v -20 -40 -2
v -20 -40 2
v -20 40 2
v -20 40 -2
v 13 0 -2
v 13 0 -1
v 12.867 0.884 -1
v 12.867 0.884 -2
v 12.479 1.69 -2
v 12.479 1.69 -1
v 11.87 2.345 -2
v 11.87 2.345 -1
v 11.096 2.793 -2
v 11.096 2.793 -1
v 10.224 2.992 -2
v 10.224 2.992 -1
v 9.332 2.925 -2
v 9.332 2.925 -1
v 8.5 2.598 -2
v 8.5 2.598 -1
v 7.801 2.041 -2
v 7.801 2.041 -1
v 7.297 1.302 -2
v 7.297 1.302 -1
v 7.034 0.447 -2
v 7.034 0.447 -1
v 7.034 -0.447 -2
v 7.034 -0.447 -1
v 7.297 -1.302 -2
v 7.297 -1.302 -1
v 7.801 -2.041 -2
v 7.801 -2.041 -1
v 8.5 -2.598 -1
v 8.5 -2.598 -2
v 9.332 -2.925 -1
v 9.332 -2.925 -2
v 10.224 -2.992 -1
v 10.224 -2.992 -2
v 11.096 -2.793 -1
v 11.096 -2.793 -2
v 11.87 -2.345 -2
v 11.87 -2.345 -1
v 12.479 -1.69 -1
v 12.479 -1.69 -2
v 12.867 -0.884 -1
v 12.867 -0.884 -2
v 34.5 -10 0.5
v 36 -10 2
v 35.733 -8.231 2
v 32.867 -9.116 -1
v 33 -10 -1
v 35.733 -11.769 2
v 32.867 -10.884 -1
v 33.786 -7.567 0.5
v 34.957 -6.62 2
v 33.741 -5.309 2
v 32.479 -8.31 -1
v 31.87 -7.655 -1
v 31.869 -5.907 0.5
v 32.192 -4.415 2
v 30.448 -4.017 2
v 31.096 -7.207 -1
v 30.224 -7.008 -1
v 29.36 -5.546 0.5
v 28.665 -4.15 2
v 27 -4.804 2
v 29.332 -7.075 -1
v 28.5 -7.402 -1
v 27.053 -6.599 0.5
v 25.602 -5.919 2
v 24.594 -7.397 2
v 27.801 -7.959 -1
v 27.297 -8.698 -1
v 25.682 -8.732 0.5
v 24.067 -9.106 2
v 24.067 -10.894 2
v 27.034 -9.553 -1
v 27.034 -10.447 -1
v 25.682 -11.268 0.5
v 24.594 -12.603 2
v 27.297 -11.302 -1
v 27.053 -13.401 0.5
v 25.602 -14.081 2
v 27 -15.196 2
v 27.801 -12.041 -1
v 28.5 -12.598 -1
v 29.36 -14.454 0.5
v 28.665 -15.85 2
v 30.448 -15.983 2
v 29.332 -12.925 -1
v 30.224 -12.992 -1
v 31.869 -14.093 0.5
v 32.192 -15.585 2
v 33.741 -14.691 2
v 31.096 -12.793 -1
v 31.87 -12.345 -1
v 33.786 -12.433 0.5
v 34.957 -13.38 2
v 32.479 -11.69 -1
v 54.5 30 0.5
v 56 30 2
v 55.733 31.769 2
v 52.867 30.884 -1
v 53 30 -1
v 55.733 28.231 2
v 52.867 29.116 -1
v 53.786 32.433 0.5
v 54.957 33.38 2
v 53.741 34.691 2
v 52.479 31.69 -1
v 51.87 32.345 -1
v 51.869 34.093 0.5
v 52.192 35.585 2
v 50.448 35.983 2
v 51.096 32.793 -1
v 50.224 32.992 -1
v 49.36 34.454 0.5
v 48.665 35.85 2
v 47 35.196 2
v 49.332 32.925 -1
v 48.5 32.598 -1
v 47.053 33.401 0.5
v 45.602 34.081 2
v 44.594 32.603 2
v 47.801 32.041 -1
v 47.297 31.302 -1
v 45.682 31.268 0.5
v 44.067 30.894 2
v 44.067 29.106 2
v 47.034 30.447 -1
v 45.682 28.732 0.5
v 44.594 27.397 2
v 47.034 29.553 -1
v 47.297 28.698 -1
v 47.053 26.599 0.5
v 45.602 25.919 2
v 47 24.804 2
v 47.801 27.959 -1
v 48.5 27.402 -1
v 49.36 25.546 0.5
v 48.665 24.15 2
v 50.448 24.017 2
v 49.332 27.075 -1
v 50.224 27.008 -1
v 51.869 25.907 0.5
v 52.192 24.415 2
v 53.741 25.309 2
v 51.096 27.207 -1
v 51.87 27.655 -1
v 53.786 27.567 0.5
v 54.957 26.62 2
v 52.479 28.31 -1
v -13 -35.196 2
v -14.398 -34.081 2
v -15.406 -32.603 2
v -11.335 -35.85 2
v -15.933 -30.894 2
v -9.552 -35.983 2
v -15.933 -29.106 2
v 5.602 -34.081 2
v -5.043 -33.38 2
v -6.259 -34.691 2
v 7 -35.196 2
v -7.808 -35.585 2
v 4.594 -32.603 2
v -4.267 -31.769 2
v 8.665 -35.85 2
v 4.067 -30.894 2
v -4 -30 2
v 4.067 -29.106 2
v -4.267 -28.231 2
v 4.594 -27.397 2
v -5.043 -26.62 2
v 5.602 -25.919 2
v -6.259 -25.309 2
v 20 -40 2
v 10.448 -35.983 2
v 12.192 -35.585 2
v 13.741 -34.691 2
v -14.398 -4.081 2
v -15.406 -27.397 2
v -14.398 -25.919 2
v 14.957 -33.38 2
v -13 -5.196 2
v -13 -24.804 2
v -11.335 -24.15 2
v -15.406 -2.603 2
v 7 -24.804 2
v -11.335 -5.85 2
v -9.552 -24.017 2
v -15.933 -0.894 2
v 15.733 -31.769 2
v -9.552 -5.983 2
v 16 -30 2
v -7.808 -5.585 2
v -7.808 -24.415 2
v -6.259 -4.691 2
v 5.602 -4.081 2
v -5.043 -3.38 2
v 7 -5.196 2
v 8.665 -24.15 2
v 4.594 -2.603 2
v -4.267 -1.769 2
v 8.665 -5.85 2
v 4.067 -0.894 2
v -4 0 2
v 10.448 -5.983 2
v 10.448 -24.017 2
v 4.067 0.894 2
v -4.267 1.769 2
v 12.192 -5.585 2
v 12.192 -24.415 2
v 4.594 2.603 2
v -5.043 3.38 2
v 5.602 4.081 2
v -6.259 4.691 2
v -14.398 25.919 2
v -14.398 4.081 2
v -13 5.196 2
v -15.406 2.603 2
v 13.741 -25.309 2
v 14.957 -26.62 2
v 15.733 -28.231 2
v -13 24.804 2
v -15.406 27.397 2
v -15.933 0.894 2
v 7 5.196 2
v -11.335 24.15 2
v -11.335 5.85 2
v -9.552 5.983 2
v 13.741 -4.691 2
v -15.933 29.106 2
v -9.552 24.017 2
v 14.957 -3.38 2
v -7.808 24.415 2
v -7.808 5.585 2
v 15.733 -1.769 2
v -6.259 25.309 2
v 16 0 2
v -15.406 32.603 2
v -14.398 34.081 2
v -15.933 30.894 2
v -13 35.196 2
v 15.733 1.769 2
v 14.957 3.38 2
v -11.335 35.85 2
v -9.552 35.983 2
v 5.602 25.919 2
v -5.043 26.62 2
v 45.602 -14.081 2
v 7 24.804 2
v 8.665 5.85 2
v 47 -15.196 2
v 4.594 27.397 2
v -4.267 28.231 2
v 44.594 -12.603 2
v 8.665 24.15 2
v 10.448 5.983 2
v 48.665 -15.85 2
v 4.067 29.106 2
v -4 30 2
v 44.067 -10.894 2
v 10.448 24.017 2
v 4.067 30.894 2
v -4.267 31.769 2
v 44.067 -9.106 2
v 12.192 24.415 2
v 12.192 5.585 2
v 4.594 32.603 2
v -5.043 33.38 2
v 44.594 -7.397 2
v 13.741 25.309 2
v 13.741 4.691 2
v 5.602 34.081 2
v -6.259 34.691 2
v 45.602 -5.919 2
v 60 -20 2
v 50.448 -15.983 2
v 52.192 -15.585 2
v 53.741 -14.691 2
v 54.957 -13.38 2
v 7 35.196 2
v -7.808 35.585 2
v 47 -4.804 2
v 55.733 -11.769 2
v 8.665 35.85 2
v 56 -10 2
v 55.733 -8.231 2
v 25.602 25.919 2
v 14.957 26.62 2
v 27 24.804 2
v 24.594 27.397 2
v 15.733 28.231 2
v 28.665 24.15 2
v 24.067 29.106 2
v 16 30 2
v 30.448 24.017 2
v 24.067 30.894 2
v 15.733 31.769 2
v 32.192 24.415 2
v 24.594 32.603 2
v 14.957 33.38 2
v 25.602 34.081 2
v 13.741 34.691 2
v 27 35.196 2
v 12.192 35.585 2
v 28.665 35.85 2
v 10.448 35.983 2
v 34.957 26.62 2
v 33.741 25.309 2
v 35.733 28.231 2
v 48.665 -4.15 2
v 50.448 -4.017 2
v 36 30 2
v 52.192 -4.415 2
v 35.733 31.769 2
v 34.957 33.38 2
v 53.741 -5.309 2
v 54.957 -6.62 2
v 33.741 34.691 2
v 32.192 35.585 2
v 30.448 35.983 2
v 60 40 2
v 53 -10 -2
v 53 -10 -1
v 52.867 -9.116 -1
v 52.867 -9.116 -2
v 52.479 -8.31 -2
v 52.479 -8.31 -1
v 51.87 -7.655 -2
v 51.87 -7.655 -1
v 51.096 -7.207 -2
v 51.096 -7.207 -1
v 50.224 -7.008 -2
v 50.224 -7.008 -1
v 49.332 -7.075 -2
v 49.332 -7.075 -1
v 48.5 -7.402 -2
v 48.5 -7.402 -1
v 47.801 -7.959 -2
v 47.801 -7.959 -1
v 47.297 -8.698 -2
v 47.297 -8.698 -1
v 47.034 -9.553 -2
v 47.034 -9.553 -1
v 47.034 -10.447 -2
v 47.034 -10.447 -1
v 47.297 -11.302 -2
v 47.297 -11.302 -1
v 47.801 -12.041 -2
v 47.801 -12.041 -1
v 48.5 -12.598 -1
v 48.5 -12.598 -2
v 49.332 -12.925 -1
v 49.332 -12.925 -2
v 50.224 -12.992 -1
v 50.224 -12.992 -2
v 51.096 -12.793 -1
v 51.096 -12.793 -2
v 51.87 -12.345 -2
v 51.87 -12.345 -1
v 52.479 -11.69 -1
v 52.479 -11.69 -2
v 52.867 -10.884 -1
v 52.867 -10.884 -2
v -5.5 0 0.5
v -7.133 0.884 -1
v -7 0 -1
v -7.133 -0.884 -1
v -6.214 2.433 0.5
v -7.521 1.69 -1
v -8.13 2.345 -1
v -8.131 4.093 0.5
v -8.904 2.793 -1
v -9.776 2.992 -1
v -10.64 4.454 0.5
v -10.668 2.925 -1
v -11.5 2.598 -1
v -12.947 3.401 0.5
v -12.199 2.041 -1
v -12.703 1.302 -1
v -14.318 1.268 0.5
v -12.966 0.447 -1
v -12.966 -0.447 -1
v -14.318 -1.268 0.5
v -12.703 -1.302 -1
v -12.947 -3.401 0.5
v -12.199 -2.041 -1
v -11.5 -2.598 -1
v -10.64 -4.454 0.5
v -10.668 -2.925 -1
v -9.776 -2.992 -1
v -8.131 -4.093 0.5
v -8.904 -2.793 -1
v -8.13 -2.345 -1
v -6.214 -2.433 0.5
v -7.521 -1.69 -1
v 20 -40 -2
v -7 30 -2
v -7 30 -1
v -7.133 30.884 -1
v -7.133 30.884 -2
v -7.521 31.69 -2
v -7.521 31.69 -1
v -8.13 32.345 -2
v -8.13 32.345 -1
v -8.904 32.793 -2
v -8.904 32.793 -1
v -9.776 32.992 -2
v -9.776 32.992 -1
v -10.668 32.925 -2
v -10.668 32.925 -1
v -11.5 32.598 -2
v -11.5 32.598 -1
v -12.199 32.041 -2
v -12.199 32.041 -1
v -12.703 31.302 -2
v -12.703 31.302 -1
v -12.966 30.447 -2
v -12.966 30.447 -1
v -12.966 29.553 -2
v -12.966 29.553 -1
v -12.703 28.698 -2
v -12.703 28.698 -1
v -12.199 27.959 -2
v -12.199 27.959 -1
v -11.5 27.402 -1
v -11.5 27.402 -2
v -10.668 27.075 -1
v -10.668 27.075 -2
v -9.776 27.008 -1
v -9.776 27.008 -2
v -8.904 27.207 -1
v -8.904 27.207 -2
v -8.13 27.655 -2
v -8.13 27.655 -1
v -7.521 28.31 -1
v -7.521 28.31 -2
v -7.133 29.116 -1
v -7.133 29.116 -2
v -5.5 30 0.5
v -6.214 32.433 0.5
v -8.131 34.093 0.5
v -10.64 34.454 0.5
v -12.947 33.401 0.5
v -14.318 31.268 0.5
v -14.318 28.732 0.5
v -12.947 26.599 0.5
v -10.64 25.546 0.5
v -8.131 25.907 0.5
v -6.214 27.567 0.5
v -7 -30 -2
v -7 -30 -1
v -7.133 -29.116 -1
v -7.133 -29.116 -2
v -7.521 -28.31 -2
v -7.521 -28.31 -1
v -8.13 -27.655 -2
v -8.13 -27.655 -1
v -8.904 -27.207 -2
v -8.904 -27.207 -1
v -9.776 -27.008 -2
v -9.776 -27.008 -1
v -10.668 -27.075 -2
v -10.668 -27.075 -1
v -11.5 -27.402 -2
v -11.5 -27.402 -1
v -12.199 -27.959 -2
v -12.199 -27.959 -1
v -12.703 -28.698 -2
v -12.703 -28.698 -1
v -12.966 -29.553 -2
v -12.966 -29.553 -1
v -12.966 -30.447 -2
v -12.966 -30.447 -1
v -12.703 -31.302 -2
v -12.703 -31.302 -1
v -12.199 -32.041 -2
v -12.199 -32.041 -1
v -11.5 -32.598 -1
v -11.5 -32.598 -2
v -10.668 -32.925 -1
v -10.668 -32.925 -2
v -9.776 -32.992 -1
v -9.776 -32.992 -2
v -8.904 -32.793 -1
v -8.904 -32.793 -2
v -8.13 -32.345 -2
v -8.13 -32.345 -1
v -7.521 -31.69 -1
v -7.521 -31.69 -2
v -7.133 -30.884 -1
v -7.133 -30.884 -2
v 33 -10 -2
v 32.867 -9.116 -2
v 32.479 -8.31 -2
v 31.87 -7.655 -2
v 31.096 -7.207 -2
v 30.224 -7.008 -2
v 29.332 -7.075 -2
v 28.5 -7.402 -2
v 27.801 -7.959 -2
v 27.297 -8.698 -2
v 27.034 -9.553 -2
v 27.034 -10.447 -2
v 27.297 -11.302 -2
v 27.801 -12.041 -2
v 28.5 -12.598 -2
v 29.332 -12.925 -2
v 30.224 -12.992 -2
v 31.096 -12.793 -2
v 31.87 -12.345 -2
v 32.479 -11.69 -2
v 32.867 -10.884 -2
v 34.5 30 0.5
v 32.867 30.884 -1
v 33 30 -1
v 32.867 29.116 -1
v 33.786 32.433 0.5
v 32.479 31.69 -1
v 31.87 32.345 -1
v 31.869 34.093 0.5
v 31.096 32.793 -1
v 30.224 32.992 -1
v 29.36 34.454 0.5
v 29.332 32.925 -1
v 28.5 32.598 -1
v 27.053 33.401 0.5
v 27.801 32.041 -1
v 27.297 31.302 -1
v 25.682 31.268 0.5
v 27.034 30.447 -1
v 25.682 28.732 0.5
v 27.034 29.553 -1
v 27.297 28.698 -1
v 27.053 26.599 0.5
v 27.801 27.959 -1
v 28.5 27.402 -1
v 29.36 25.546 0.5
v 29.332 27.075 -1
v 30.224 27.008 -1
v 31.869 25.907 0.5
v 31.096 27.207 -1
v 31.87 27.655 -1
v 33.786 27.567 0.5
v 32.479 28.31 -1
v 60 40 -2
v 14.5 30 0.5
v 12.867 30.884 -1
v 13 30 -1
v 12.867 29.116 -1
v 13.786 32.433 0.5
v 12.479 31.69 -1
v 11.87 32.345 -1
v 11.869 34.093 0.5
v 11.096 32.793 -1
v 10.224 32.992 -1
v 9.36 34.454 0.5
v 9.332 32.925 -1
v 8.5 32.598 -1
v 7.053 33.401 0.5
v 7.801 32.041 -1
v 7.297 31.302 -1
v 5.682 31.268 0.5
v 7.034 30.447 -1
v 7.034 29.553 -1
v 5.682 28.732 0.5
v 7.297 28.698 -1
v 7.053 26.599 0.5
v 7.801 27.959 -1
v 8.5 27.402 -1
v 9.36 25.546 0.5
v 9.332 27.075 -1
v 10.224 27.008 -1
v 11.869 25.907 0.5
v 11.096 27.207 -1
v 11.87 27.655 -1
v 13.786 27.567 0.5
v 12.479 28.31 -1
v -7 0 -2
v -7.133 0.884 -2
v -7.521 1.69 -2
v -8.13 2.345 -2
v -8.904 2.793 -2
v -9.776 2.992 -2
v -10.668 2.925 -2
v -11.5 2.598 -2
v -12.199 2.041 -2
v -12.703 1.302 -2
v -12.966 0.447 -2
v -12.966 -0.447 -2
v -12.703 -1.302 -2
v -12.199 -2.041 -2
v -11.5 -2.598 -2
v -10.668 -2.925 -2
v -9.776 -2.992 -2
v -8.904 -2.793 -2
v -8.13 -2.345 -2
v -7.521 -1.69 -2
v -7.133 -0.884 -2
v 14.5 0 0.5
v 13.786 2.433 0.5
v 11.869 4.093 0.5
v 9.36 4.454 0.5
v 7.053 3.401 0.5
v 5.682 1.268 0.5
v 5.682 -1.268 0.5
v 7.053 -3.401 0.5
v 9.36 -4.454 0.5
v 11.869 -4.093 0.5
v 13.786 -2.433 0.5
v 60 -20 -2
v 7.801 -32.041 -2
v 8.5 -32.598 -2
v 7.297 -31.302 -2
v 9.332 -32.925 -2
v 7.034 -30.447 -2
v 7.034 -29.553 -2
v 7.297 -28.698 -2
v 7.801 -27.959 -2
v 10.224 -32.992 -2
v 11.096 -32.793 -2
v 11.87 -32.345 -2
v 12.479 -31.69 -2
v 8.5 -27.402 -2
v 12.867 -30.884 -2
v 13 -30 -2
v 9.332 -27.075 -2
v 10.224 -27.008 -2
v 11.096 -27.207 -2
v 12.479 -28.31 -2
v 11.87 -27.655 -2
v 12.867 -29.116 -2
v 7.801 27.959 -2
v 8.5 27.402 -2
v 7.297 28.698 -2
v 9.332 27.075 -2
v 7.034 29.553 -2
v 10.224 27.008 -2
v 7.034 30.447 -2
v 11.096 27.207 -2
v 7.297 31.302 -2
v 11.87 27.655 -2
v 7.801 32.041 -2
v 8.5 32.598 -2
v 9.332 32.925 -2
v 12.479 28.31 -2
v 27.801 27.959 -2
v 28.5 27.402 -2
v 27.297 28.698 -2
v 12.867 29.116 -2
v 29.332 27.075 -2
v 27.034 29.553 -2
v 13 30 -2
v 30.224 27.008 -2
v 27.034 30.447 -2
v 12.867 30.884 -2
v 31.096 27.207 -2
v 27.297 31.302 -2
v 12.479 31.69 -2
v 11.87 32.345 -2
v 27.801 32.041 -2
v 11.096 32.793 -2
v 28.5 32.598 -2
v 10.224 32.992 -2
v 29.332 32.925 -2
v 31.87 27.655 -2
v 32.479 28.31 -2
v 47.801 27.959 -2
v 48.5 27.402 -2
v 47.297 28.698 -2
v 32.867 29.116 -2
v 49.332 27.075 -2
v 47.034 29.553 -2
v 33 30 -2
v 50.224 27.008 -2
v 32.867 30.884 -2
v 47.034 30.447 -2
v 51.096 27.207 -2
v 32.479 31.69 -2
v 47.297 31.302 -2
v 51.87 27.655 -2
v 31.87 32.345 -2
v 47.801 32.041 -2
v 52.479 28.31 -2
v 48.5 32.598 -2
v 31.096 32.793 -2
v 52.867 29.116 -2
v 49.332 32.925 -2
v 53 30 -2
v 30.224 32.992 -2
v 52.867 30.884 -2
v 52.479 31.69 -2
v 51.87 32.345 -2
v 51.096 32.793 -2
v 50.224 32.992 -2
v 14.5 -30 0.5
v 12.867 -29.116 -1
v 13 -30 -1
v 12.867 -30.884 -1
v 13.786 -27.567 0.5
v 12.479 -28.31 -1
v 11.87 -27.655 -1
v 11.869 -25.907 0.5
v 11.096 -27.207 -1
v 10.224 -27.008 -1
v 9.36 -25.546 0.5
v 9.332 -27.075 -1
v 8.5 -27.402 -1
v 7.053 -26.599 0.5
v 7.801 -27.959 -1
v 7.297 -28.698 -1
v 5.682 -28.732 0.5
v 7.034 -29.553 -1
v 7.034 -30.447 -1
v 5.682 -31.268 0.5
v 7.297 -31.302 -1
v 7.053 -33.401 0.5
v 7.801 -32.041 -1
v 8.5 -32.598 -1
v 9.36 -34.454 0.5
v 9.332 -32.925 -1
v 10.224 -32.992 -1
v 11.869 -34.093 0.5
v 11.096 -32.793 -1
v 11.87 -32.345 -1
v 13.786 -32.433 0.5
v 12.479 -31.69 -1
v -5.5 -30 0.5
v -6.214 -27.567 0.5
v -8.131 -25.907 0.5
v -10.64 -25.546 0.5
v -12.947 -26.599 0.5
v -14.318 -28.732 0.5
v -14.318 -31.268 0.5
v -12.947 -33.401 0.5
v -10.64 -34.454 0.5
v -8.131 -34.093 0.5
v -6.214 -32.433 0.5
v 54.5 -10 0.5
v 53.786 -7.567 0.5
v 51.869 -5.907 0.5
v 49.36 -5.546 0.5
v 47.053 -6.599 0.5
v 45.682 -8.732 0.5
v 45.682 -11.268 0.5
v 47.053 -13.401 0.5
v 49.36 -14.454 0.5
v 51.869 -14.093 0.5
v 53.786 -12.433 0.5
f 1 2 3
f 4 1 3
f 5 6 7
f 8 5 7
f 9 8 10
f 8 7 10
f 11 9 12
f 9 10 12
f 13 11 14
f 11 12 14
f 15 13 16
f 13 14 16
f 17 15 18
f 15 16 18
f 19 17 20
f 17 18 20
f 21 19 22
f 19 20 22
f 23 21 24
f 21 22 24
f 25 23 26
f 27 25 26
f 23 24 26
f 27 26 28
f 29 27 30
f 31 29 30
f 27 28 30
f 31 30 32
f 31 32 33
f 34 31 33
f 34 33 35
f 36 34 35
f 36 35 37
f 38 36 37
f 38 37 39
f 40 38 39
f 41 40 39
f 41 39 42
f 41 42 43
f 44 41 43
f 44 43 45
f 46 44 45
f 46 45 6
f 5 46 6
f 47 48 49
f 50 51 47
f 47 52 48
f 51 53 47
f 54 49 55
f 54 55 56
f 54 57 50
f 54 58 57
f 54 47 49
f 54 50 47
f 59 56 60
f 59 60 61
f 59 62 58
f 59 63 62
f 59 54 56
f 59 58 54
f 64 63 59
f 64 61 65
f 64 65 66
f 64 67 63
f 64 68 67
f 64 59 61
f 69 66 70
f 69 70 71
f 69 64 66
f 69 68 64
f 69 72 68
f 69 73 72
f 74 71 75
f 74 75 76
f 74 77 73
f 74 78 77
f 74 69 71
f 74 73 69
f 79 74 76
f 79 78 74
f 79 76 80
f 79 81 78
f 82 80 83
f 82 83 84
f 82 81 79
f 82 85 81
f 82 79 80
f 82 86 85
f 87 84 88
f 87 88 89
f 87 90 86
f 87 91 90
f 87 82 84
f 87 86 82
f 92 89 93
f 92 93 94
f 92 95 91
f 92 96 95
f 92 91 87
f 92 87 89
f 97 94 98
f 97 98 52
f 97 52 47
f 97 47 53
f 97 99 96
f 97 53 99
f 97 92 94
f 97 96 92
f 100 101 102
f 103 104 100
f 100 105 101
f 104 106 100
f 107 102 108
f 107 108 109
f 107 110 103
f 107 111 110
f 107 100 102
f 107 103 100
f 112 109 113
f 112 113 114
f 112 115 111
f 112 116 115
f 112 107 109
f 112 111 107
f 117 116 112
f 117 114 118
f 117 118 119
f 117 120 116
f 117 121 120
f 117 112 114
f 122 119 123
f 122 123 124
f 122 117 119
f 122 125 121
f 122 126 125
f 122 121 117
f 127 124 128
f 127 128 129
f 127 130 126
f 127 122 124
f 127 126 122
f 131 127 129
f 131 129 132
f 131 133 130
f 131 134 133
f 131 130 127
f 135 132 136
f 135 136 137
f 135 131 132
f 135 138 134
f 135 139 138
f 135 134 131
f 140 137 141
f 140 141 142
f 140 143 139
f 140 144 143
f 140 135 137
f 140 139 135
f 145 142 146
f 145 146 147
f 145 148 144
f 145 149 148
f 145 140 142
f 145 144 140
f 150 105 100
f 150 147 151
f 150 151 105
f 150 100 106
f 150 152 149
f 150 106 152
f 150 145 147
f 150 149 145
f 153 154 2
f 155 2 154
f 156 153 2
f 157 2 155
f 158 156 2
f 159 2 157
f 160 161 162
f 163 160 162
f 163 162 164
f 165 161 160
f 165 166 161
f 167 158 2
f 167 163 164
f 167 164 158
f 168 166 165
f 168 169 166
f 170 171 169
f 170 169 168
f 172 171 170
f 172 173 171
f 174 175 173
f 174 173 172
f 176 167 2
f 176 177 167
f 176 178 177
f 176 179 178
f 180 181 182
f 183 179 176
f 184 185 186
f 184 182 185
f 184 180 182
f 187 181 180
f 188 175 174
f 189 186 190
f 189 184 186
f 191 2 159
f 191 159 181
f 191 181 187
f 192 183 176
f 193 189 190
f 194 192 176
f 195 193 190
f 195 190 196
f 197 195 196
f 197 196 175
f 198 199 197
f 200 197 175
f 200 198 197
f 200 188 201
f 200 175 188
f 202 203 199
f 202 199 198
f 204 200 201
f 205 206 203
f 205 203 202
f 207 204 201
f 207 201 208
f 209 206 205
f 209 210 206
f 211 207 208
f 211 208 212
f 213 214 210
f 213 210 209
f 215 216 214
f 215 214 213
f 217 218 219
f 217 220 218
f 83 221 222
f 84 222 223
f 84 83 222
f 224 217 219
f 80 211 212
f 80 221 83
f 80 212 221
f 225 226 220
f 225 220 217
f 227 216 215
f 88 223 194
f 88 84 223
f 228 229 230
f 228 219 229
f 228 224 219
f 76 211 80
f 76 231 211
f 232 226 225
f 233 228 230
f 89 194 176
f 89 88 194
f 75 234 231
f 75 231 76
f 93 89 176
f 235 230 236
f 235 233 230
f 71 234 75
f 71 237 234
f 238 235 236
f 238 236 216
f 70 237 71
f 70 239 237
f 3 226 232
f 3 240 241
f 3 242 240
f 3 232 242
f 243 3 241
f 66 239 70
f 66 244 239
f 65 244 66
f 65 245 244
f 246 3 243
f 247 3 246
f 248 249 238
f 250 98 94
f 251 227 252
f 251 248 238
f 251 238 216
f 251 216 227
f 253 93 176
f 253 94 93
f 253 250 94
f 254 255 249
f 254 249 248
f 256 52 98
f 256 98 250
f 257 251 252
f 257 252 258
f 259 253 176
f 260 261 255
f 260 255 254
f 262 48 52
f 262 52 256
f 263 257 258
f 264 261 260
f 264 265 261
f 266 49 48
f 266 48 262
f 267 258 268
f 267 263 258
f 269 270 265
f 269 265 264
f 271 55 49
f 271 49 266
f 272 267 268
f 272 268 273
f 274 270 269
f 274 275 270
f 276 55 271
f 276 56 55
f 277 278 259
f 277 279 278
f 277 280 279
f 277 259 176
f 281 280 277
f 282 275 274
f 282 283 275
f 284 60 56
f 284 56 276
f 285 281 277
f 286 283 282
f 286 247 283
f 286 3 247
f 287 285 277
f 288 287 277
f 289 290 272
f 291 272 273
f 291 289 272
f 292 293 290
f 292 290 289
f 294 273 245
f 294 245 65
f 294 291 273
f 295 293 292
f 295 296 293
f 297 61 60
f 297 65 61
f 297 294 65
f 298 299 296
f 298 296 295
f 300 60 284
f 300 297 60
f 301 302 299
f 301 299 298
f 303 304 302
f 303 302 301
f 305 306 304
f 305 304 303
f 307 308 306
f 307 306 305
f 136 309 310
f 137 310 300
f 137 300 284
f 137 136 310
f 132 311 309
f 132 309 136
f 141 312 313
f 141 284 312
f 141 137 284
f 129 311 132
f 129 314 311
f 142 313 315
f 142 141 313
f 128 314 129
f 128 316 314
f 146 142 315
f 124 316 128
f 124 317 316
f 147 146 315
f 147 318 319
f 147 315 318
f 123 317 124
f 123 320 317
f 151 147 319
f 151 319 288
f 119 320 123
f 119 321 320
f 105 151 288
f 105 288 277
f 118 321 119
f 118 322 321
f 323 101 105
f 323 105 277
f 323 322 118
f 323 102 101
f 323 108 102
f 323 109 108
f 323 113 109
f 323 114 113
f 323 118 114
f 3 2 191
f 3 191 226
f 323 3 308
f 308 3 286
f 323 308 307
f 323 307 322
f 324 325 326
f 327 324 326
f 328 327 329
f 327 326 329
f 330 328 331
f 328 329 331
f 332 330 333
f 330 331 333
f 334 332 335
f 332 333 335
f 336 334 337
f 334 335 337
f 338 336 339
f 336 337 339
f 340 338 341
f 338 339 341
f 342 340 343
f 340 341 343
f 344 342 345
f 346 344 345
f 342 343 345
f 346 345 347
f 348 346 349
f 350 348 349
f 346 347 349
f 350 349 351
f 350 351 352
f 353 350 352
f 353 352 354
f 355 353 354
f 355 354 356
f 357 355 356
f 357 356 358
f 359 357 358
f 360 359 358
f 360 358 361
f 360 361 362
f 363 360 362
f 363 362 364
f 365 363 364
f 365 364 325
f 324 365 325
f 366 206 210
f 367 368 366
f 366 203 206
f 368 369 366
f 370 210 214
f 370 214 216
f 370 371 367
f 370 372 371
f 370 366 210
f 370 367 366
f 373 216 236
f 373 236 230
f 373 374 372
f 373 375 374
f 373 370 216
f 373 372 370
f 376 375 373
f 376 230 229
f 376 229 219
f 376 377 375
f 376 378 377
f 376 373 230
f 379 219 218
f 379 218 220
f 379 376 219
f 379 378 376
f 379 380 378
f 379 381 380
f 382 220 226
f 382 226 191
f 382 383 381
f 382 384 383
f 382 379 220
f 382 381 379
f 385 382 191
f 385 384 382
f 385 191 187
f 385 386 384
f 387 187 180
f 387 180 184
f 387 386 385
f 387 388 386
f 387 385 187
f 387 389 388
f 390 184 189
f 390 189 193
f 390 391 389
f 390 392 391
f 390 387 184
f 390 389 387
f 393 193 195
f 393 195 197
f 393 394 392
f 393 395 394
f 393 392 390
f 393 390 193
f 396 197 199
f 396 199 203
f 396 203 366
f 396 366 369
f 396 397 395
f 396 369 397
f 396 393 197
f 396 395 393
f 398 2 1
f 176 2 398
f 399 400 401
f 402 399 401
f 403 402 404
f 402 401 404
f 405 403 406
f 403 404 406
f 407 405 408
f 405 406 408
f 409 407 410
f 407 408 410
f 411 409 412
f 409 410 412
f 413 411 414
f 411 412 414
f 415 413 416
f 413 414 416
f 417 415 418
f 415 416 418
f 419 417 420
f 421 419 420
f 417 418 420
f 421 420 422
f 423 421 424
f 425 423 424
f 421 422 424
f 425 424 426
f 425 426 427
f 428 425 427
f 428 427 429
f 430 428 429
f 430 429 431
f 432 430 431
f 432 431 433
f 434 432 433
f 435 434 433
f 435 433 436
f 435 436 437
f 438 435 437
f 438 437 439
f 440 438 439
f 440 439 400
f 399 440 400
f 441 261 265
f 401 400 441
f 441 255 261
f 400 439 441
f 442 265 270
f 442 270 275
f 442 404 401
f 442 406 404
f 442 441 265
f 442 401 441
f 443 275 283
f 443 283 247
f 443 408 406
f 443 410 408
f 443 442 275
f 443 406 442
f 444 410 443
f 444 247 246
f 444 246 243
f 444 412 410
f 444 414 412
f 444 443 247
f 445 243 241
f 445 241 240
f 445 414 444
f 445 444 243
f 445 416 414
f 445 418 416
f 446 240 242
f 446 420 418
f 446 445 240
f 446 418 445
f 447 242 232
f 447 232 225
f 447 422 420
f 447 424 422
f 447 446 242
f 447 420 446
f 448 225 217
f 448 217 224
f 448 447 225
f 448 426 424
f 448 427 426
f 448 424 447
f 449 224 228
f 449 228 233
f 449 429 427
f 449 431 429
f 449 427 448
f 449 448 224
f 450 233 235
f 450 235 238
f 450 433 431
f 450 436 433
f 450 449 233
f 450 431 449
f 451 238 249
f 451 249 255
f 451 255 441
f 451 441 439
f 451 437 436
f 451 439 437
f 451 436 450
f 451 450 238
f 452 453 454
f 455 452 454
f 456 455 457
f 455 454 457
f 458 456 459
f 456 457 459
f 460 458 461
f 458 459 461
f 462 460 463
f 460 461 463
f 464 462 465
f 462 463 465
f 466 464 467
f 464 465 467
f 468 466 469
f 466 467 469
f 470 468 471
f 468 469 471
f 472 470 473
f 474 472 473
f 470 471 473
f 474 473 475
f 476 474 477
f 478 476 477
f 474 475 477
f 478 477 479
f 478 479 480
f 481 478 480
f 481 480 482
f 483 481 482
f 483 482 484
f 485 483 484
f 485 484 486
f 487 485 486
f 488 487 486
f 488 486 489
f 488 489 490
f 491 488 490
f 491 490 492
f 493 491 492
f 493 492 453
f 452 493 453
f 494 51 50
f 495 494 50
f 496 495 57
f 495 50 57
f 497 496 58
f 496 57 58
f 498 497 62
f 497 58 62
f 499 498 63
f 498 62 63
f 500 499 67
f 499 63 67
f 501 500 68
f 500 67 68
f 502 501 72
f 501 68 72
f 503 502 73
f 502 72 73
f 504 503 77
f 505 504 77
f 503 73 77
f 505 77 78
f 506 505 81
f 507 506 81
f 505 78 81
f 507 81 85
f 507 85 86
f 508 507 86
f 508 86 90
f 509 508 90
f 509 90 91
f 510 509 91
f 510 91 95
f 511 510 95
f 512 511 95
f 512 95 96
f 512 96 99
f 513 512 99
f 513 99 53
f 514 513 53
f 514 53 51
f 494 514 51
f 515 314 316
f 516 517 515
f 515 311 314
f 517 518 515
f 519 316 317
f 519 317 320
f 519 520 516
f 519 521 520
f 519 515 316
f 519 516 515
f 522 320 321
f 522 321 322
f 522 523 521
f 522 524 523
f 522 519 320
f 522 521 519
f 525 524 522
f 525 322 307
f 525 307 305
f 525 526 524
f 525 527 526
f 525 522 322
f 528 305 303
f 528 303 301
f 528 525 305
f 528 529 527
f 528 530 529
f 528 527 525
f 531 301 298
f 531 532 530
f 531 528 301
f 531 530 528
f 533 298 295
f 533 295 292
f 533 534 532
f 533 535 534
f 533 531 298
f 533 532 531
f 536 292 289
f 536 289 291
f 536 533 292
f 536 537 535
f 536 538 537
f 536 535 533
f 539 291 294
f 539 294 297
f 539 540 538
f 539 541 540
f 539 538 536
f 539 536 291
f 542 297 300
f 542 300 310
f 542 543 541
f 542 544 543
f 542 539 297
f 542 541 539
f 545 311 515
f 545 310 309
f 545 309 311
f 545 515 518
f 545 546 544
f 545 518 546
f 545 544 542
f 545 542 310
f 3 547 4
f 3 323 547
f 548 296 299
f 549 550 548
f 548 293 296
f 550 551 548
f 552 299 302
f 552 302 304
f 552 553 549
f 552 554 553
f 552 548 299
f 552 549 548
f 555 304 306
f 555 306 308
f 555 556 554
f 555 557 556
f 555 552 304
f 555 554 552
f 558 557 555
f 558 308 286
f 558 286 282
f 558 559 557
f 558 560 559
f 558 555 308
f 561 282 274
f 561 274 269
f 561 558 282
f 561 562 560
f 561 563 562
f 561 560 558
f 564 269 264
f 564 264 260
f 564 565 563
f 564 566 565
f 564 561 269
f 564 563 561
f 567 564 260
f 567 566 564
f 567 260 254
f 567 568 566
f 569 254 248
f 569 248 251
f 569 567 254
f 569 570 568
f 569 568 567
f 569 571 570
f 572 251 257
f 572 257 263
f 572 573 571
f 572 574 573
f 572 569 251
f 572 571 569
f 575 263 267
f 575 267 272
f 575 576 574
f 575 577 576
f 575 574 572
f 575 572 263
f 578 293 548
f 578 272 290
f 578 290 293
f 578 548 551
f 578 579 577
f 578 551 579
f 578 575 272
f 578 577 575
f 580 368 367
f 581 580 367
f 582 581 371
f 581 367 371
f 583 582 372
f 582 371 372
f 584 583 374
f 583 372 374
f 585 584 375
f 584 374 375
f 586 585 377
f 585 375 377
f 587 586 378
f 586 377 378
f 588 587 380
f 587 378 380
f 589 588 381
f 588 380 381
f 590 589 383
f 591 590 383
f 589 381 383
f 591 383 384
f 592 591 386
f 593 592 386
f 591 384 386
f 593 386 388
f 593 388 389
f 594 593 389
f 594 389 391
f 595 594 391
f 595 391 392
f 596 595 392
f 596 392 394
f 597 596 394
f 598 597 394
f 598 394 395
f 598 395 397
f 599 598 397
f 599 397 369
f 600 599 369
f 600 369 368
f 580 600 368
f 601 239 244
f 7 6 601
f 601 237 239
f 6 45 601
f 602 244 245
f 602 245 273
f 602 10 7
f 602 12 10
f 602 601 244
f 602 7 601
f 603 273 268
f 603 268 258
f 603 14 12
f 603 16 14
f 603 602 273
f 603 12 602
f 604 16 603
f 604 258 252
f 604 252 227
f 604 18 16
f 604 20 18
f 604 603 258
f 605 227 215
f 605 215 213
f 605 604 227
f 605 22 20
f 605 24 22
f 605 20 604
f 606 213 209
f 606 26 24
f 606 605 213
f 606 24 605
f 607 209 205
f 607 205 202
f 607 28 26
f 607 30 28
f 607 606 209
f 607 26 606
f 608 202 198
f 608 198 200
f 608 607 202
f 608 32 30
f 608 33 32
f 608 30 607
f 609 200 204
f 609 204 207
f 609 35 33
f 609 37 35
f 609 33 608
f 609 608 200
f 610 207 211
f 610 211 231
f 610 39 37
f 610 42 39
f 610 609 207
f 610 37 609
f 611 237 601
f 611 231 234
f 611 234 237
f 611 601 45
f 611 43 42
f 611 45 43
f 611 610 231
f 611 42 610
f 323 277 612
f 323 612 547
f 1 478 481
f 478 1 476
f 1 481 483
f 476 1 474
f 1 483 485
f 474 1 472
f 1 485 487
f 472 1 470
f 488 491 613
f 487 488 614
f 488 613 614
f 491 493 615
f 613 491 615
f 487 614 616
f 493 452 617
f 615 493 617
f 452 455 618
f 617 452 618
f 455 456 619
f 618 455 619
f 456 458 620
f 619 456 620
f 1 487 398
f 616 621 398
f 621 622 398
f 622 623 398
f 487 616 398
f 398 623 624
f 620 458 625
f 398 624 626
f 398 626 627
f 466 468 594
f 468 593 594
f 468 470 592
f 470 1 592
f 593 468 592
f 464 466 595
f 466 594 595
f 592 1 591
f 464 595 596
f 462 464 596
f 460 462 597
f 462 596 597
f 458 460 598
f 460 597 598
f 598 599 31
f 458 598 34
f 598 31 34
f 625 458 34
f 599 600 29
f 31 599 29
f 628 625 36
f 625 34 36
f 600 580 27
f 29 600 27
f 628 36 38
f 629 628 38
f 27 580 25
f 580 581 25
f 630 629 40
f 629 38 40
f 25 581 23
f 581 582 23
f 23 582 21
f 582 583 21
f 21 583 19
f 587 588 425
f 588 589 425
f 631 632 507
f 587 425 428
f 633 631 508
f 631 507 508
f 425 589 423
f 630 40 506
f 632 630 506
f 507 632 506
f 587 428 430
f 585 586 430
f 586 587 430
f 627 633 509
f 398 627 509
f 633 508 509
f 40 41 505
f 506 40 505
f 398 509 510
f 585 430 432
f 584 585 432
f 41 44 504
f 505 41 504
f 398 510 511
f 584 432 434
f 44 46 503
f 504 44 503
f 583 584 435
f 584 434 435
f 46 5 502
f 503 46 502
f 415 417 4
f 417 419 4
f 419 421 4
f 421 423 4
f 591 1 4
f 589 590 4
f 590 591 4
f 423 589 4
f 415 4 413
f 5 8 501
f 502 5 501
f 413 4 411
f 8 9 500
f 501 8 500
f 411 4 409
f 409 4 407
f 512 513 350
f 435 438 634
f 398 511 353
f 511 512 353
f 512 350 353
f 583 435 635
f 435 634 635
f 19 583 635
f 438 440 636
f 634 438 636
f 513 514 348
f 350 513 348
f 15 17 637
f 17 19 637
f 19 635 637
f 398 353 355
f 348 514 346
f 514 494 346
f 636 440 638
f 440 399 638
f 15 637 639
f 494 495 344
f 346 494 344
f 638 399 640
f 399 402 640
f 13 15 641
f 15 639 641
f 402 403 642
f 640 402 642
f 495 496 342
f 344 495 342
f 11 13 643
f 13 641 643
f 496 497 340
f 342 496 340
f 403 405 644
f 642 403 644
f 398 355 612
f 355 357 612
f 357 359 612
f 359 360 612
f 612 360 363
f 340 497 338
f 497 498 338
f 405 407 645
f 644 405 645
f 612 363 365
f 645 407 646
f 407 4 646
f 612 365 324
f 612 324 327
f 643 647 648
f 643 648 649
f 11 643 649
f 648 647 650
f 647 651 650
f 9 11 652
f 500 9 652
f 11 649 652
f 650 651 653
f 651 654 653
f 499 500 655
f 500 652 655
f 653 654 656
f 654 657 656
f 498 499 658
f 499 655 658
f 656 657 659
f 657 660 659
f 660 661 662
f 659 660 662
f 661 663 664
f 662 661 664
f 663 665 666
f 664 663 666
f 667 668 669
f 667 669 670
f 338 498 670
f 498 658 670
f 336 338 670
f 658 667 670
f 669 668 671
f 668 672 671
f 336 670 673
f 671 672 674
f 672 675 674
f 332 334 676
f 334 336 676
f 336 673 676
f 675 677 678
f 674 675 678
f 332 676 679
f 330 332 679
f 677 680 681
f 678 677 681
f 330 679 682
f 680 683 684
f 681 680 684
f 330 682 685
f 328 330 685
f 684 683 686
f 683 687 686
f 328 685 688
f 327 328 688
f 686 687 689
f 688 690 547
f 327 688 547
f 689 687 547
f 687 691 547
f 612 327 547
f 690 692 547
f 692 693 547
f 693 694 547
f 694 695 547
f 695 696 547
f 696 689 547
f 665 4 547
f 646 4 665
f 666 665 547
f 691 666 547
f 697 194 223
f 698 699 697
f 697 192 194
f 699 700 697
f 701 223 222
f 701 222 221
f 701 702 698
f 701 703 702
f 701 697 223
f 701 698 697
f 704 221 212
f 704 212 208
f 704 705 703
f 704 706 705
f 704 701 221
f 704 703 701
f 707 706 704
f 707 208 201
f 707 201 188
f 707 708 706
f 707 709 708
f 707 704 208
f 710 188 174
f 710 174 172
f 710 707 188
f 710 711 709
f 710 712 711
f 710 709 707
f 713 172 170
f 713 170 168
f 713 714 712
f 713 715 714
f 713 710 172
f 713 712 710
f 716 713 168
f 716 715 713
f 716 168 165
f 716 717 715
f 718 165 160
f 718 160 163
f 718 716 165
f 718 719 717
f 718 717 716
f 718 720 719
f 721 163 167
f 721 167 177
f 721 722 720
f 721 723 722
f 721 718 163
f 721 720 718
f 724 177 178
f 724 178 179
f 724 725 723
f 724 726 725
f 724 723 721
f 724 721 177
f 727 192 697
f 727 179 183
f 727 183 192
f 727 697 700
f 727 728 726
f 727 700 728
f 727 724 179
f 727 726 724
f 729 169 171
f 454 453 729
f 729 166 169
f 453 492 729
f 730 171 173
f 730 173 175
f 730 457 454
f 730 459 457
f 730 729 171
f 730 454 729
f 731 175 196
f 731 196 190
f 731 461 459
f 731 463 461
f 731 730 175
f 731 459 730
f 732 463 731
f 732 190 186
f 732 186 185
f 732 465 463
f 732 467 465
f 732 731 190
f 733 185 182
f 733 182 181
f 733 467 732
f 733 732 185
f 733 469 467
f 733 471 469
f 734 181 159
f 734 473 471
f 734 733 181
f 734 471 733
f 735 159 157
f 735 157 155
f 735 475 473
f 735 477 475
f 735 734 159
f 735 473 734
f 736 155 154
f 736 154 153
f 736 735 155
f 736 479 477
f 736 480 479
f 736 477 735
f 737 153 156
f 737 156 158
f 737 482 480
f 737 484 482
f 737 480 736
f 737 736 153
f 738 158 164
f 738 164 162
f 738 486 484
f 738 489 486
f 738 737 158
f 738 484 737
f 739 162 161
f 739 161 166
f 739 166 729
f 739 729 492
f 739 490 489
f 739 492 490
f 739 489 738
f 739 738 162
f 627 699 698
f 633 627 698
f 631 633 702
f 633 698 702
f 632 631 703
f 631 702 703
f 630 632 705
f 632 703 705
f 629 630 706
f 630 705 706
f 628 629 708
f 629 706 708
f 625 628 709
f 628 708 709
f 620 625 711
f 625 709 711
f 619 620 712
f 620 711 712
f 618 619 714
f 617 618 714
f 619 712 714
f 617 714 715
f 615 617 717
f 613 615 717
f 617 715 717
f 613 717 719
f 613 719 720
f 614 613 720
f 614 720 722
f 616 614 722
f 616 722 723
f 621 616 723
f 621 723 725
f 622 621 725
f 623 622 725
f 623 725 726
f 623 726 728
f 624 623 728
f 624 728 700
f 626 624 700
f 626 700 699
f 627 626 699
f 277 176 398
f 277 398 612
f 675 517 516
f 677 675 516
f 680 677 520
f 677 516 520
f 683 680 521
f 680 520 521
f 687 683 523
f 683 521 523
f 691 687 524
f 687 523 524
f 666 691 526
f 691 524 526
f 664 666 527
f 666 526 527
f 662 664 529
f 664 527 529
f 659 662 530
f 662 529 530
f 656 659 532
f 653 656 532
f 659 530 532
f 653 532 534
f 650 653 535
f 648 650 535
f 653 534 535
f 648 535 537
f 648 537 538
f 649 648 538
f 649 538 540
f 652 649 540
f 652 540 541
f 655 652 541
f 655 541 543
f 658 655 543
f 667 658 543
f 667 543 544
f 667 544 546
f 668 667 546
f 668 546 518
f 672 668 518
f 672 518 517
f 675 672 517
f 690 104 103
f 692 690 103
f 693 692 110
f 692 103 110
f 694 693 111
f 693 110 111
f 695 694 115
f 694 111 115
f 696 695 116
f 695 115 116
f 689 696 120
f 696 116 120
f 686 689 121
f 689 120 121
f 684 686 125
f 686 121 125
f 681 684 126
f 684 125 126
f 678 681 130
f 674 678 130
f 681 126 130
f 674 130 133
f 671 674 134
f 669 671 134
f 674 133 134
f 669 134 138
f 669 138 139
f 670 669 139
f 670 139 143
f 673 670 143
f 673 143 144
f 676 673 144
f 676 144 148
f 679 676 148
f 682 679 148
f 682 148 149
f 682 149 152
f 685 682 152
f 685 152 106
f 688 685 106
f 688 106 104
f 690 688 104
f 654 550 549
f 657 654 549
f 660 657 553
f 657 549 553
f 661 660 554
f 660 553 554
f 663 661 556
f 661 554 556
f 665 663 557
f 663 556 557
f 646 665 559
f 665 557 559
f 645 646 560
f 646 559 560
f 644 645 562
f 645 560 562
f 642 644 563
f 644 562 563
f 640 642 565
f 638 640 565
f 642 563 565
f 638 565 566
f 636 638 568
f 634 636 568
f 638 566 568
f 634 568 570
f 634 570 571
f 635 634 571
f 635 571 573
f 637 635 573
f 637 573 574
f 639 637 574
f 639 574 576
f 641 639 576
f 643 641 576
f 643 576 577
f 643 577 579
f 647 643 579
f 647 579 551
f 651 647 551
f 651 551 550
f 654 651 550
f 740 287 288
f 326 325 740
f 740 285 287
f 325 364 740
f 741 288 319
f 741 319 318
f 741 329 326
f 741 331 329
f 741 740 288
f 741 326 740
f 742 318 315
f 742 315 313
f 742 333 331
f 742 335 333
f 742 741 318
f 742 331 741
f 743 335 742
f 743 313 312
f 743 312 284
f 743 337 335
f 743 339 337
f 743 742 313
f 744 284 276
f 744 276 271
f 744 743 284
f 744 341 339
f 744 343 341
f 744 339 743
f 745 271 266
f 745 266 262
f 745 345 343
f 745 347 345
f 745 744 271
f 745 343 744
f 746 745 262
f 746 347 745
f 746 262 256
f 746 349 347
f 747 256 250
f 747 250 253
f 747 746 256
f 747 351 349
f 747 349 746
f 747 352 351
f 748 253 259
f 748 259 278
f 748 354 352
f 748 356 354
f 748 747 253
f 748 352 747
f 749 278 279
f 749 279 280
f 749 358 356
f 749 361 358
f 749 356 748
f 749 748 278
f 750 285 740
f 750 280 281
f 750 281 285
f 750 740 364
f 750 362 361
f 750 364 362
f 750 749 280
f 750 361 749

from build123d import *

# Parameters (mm, degrees)
SKETCH1_W           = 40
SKETCH1_H           = 80
SKETCH1_H_2         = 60
BOSS_EXTRUDE1_DEPTH = 2
SKETCH2_R           = 3
CUT_EXTRUDE1_DEPTH  = 5
CHAMFER1_SIZE       = 3


with BuildPart() as part:
    # Sketch1 → Boss-Extrude1 (new body, symmetric)
    with BuildSketch(Plane.XY):
        Rectangle(SKETCH1_W, SKETCH1_H)
        Polygon((20, -20), (20, -40), (60, -20), align=None)
        with Locations((40, 10)):
            Rectangle(SKETCH1_W, SKETCH1_H_2)
    extrude(amount=BOSS_EXTRUDE1_DEPTH, both=True)

    # Sketch2 → Cut-Extrude1 (cut, through all)
    with BuildSketch(Plane.XY.offset(2)):
        with Locations((50, 30)):
            Circle(SKETCH2_R)
        with Locations((30, 30)):
            Circle(SKETCH2_R)
        with Locations((50, -10)):
            Circle(SKETCH2_R)
        with Locations((30, -10)):
            Circle(SKETCH2_R)
        with Locations((-10, 30)):
            Circle(SKETCH2_R)
        with Locations((10, 30)):
            Circle(SKETCH2_R)
        with Locations((-10, 0)):
            Circle(SKETCH2_R)
        with Locations((10, 0)):
            Circle(SKETCH2_R)
        with Locations((-10, -30)):
            Circle(SKETCH2_R)
        with Locations((10, -30)):
            Circle(SKETCH2_R)
    extrude(amount=-CUT_EXTRUDE1_DEPTH, mode=Mode.SUBTRACT)

    # Chamfer1
    chamfer1_edges = [part.edges().sort_by_distance(p)[0] for p in [
        (7, 30, 2),
        (-13, 0, 2),
        (7, 0, 2),
        (-13, -30, 2),
        (27, 30, 2),
        (47, -10, 2),
        (27, -10, 2),
        (-13, 30, 2),
        (7, -30, 2),
        (47, 30, 2),
    ]]
    chamfer(chamfer1_edges, length=CHAMFER1_SIZE)


solid = part.part
